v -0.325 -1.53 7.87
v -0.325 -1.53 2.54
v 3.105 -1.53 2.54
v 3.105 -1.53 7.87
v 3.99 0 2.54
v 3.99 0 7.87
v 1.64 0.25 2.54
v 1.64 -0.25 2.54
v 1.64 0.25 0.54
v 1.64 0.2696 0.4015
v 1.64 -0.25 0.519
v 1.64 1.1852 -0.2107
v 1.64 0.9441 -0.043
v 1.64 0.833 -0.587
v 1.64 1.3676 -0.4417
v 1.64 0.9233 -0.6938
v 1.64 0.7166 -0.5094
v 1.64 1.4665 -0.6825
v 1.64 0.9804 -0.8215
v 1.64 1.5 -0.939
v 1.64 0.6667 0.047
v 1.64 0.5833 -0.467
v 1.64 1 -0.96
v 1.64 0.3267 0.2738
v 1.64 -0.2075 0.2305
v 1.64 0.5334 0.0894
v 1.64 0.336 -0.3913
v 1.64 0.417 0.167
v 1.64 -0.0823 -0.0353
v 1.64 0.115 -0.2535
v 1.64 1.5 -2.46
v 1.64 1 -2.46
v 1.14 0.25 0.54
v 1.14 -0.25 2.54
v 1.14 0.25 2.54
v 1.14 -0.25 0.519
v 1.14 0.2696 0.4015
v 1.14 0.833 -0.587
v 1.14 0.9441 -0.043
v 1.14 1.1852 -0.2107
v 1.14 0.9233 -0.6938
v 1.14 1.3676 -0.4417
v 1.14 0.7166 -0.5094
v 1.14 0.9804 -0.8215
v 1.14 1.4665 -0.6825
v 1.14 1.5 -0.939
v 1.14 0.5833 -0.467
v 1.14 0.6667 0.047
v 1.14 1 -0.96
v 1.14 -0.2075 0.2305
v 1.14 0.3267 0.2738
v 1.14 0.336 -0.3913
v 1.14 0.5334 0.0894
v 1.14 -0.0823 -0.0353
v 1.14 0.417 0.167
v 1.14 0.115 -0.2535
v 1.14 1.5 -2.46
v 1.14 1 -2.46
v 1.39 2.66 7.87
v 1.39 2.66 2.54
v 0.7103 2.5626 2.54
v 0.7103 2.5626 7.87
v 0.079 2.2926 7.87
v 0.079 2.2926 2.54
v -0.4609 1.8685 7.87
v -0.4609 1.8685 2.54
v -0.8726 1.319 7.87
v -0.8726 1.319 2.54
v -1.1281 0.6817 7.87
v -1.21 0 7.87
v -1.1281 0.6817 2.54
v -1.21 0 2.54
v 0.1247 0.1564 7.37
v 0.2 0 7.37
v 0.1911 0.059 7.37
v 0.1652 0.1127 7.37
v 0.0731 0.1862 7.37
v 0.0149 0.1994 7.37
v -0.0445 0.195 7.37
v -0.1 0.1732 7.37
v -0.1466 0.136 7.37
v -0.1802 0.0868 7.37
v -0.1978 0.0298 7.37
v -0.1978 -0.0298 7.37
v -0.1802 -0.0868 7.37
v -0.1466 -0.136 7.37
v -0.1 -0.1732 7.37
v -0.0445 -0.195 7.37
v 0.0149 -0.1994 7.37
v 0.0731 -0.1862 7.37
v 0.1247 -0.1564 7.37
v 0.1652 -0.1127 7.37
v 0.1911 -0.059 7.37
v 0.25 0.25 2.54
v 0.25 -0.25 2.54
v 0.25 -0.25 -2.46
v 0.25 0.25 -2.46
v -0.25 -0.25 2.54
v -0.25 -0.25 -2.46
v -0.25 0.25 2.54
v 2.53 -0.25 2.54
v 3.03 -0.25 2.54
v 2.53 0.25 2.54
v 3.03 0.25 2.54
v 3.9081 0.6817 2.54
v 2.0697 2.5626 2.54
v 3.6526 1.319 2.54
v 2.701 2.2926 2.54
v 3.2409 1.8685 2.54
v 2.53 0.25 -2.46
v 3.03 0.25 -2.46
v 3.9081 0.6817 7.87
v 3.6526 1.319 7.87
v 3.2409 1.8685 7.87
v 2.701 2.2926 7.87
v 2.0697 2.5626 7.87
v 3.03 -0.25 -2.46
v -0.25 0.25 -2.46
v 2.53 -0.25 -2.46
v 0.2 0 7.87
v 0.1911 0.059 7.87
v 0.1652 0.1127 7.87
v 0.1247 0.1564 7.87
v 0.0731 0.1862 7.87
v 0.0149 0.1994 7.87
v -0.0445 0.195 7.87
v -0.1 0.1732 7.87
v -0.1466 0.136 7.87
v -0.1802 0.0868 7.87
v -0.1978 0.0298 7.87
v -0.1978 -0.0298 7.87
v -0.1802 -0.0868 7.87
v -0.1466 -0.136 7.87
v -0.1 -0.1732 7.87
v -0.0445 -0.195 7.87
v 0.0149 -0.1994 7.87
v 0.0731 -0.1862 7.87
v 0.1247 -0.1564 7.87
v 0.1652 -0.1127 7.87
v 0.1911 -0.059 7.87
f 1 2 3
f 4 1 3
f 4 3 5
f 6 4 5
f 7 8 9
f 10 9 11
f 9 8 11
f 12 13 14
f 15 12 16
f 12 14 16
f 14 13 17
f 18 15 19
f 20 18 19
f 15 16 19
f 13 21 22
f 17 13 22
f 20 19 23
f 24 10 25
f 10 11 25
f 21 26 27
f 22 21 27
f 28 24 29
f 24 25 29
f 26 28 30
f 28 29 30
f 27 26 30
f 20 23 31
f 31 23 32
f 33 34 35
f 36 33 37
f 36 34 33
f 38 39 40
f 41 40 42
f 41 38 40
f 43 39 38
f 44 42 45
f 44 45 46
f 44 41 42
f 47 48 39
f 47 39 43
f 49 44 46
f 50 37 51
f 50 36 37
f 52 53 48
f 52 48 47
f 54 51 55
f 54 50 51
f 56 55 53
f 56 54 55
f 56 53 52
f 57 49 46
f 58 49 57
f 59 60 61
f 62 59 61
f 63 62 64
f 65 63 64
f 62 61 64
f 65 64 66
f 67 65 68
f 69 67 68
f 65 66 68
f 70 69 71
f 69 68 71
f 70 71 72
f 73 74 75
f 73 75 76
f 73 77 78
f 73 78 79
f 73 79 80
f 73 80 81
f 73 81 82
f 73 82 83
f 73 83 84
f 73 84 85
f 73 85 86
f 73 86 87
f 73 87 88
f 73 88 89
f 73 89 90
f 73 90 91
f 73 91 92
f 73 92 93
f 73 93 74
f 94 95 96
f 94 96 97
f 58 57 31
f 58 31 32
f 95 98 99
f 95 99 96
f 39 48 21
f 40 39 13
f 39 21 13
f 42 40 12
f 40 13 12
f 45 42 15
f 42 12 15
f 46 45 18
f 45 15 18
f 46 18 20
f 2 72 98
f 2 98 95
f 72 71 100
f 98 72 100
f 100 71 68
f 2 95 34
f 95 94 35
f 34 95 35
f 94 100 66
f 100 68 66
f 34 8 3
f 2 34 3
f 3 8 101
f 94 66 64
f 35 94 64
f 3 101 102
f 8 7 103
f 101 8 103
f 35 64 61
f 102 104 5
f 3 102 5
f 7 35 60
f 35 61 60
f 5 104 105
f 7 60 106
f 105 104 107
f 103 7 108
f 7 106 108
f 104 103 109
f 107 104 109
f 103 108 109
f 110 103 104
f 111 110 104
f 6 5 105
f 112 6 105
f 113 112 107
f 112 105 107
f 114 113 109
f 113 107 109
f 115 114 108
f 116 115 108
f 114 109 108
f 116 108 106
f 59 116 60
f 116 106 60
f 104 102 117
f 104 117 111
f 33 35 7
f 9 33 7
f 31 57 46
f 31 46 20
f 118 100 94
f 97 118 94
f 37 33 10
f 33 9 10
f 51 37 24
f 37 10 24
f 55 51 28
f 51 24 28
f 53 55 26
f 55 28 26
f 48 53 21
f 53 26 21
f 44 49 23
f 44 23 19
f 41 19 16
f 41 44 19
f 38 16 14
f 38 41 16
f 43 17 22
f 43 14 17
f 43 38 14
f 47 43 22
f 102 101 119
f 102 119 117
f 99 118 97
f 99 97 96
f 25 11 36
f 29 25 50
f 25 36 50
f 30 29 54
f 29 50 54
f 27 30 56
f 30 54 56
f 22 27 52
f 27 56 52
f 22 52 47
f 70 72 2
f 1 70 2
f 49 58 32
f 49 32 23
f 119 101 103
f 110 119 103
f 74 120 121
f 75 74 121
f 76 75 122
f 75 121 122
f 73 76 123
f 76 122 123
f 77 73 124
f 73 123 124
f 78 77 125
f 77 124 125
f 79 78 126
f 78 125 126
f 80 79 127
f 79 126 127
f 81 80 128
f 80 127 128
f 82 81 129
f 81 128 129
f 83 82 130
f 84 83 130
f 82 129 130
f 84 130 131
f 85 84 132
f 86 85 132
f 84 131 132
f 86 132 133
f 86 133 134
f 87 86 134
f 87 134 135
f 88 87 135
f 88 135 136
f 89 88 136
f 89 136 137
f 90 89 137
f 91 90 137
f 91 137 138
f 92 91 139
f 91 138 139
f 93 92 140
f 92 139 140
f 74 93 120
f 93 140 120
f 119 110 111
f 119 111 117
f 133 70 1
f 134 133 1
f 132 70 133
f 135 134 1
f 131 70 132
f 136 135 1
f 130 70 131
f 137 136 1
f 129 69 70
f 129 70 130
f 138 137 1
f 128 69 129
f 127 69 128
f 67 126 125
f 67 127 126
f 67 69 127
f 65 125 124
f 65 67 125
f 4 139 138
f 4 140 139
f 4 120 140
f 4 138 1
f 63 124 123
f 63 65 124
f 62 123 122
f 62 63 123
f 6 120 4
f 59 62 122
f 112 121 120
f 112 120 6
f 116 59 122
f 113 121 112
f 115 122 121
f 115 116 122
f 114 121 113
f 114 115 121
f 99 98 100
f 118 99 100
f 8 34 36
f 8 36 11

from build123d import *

# Parameters (mm, degrees)
EXTRUDE_1_DEPTH          = 5.33
SKETCH_1_W               = 0.5
SKETCH_1_H               = 0.5
EXTRUDE_2_DEPTH          = 2.54
SKETCH_1_2_W             = 0.5
SKETCH_1_2_H             = 0.5
EXTRUDE_3_DEPTH          = 10.16
SKETCH_4_R               = 0.2
CUT_EXTRUDE_1_DEPTH      = 0.5
SKETCH_5_W               = 0.5
SKETCH_5_H               = 10.2
EXTRUDE_4_DEPTH          = 1.25
CUT_EXTRUDE_2_DEPTH      = 10
CUT_EXTRUDE_2_DEPTH_BACK = 10
FILLET_1_R               = 0.5
FILLET_2_R               = 1
SKETCH_7_W               = 0.5
SKETCH_7_H               = 0.75
CUT_EXTRUDE_3_DEPTH      = 2
FILLET_3_R               = 1


with BuildPart() as part:
    # Эскиз3 → Вытянуть1 (new body)
    with BuildSketch(Plane.XY.offset(2.54)):
        with BuildLine():
            Line((-0.325, -1.53), (3.105, -1.53))
            Line((3.105, -1.53), (3.99, 0))
            ThreePointArc((3.99, 0), (3.240904038, 1.868477631), (1.39, 2.66))
            ThreePointArc((1.39, 2.66), (-0.460904038, 1.868477631), (-1.21, 0))
            Line((-1.21, 0), (-0.325, -1.53))
        make_face()
    extrude(amount=EXTRUDE_1_DEPTH)

    # Эскиз1 → Вытянуть2 (add)
    with BuildSketch(Plane.XY):
        with Locations((1.39, 0)):
            Rectangle(SKETCH_1_W, SKETCH_1_H)
        Rectangle(SKETCH_1_W, SKETCH_1_H)
        with Locations((2.78, 0)):
            Rectangle(SKETCH_1_W, SKETCH_1_H)
    extrude(amount=EXTRUDE_2_DEPTH)

    # Эскиз1<2> → Вытянуть3 (add)
    with BuildSketch(Plane.XY):
        with Locations((1.39, 0)):
            Rectangle(SKETCH_1_2_W, SKETCH_1_2_H)
        Rectangle(SKETCH_1_2_W, SKETCH_1_2_H)
        with Locations((2.78, 0)):
            Rectangle(SKETCH_1_2_W, SKETCH_1_2_H)
    extrude(amount=-EXTRUDE_3_DEPTH)

    # Эскиз4 → Вырез-Вытянуть1 (cut)
    with BuildSketch(Plane.XY.offset(7.87)):
        Circle(SKETCH_4_R)
    extrude(amount=-CUT_EXTRUDE_1_DEPTH, mode=Mode.SUBTRACT)

    # Эскиз5 → Вытянуть4 (add)
    with BuildSketch(Plane(origin=(0, 0.25, 0), x_dir=(1, 0, 0), z_dir=(0, 1, 0))):
        with Locations((1.39, 5.06)):
            Rectangle(SKETCH_5_W, SKETCH_5_H)
    extrude(amount=EXTRUDE_4_DEPTH)

    # Эскиз6 → Вырез-Вытянуть2 (cut, two sides: drawn at the far end of the back side and taken through both)
    with BuildSketch(Plane(origin=(1.64, 0, 0), x_dir=(0, 0, -1), z_dir=(1, 0, 0)).offset(-CUT_EXTRUDE_2_DEPTH_BACK)):
        with BuildLine():
            Line((2.46, -0.83850211), (10.787068804, -0.83850211))
            Line((10.787068804, -0.83850211), (10.787068804, 1))
            Line((10.787068804, 1), (10.787068804, 2.286855948))
            Line((10.787068804, 2.286855948), (2.46, 2.286855948))
            Line((2.46, 2.286855948), (2.46, 1))
            Line((2.46, 1), (0.96, 1))
            ThreePointArc((0.96, 1), (0.606446609, 0.853553391), (0.46, 0.5))
            Line((0.46, 0.5), (2.46, 0.5))
            Line((2.46, 0.5), (2.46, -0.83850211))
        make_face()
    extrude(amount=CUT_EXTRUDE_2_DEPTH + CUT_EXTRUDE_2_DEPTH_BACK, mode=Mode.SUBTRACT)

    # Скругление1
    fillet_1_edges = [part.edges().sort_by_distance(p)[0] for p in [
        (1.39, 0.25, 0.04),
    ]]
    fillet(fillet_1_edges, radius=FILLET_1_R)

    # Скругление2
    fillet_2_edges = [part.edges().sort_by_distance(p)[0] for p in [
        (1.39, 1.5, 0.04),
    ]]
    fillet(fillet_2_edges, radius=FILLET_2_R)

    # Эскиз7 → Вырез-Вытянуть3 (cut)
    with BuildSketch(Plane(origin=(0, 0, -2.46), x_dir=(-1, 0, 0), z_dir=(0, 0, -1))):
        with Locations((-1.39, 0.125)):
            Rectangle(SKETCH_7_W, SKETCH_7_H)
    extrude(amount=-CUT_EXTRUDE_3_DEPTH, mode=Mode.SUBTRACT)

    # Скругление3
    fillet_3_edges = [part.edges().sort_by_distance(p)[0] for p in [
        (1.39, -0.25, -0.46),
    ]]
    fillet(fillet_3_edges, radius=FILLET_3_R)


solid = part.part
